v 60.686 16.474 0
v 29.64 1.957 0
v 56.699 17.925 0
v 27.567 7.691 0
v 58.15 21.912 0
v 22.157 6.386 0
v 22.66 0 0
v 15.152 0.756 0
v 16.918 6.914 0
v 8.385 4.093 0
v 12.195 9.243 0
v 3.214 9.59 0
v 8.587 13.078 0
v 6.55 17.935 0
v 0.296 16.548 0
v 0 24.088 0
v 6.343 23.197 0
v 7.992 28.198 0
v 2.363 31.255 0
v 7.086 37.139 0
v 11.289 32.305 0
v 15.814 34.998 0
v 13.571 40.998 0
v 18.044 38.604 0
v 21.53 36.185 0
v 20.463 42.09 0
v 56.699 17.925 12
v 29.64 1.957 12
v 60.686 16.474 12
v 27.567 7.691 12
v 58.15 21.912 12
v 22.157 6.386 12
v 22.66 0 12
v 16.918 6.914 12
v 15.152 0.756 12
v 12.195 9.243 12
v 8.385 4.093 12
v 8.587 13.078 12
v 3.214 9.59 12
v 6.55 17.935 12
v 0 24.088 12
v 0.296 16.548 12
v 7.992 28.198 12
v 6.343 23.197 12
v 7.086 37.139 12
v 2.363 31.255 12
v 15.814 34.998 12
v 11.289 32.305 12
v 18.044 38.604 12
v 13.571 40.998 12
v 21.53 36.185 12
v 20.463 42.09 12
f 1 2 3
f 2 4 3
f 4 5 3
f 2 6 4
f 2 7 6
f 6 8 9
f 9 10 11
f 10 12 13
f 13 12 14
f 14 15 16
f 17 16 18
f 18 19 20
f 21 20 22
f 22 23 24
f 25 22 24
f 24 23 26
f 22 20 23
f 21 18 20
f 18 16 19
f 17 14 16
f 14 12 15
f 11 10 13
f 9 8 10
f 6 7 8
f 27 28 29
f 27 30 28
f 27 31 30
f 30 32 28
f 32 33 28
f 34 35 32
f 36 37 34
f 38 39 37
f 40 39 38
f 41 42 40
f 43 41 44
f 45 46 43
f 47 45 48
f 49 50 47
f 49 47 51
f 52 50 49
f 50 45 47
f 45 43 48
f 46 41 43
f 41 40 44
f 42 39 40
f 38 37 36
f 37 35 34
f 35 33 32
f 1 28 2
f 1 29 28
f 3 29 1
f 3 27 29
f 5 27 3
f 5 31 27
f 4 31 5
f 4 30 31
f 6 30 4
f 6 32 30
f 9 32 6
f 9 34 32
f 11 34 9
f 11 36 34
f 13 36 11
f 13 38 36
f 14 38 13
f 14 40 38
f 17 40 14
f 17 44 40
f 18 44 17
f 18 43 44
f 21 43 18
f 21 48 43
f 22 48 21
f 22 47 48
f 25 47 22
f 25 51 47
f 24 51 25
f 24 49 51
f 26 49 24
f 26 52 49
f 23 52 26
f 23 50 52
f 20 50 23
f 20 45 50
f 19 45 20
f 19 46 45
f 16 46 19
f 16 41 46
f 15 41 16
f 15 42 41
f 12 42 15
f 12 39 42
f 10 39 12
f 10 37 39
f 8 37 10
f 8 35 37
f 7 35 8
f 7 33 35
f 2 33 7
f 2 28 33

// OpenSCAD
$fn = 32;

// ----------------------------------------------------------------------
// Hook plate: curl radius 18 mm over 205 degrees, 6 mm thick band
// ----------------------------------------------------------------------

// --- parameters (mm) ---
profile_height = 12;      // extrusion height
profile_points = 26;      // points of the closed outline

profile = [[18.044, 38.604], [20.463, 42.09], [13.571, 40.998], [7.086, 37.139], [2.363, 31.255], [0, 24.088], [0.296, 16.548], [3.214, 9.59], [8.385, 4.093], [15.152, 0.756], [22.66, 0], [29.64, 1.957], [60.686, 16.474], [56.699, 17.925], [58.15, 21.912], [27.567, 7.691], [22.157, 6.386], [16.918, 6.914], [12.195, 9.243], [8.587, 13.078], [6.55, 17.935], [6.343, 23.197], [7.992, 28.198], [11.289, 32.305], [15.814, 34.998], [21.53, 36.185]];  // single closed polygon, 26 points, counter clockwise

// --- the one profile operation ---
linear_extrude(height = profile_height) polygon(points = profile);
